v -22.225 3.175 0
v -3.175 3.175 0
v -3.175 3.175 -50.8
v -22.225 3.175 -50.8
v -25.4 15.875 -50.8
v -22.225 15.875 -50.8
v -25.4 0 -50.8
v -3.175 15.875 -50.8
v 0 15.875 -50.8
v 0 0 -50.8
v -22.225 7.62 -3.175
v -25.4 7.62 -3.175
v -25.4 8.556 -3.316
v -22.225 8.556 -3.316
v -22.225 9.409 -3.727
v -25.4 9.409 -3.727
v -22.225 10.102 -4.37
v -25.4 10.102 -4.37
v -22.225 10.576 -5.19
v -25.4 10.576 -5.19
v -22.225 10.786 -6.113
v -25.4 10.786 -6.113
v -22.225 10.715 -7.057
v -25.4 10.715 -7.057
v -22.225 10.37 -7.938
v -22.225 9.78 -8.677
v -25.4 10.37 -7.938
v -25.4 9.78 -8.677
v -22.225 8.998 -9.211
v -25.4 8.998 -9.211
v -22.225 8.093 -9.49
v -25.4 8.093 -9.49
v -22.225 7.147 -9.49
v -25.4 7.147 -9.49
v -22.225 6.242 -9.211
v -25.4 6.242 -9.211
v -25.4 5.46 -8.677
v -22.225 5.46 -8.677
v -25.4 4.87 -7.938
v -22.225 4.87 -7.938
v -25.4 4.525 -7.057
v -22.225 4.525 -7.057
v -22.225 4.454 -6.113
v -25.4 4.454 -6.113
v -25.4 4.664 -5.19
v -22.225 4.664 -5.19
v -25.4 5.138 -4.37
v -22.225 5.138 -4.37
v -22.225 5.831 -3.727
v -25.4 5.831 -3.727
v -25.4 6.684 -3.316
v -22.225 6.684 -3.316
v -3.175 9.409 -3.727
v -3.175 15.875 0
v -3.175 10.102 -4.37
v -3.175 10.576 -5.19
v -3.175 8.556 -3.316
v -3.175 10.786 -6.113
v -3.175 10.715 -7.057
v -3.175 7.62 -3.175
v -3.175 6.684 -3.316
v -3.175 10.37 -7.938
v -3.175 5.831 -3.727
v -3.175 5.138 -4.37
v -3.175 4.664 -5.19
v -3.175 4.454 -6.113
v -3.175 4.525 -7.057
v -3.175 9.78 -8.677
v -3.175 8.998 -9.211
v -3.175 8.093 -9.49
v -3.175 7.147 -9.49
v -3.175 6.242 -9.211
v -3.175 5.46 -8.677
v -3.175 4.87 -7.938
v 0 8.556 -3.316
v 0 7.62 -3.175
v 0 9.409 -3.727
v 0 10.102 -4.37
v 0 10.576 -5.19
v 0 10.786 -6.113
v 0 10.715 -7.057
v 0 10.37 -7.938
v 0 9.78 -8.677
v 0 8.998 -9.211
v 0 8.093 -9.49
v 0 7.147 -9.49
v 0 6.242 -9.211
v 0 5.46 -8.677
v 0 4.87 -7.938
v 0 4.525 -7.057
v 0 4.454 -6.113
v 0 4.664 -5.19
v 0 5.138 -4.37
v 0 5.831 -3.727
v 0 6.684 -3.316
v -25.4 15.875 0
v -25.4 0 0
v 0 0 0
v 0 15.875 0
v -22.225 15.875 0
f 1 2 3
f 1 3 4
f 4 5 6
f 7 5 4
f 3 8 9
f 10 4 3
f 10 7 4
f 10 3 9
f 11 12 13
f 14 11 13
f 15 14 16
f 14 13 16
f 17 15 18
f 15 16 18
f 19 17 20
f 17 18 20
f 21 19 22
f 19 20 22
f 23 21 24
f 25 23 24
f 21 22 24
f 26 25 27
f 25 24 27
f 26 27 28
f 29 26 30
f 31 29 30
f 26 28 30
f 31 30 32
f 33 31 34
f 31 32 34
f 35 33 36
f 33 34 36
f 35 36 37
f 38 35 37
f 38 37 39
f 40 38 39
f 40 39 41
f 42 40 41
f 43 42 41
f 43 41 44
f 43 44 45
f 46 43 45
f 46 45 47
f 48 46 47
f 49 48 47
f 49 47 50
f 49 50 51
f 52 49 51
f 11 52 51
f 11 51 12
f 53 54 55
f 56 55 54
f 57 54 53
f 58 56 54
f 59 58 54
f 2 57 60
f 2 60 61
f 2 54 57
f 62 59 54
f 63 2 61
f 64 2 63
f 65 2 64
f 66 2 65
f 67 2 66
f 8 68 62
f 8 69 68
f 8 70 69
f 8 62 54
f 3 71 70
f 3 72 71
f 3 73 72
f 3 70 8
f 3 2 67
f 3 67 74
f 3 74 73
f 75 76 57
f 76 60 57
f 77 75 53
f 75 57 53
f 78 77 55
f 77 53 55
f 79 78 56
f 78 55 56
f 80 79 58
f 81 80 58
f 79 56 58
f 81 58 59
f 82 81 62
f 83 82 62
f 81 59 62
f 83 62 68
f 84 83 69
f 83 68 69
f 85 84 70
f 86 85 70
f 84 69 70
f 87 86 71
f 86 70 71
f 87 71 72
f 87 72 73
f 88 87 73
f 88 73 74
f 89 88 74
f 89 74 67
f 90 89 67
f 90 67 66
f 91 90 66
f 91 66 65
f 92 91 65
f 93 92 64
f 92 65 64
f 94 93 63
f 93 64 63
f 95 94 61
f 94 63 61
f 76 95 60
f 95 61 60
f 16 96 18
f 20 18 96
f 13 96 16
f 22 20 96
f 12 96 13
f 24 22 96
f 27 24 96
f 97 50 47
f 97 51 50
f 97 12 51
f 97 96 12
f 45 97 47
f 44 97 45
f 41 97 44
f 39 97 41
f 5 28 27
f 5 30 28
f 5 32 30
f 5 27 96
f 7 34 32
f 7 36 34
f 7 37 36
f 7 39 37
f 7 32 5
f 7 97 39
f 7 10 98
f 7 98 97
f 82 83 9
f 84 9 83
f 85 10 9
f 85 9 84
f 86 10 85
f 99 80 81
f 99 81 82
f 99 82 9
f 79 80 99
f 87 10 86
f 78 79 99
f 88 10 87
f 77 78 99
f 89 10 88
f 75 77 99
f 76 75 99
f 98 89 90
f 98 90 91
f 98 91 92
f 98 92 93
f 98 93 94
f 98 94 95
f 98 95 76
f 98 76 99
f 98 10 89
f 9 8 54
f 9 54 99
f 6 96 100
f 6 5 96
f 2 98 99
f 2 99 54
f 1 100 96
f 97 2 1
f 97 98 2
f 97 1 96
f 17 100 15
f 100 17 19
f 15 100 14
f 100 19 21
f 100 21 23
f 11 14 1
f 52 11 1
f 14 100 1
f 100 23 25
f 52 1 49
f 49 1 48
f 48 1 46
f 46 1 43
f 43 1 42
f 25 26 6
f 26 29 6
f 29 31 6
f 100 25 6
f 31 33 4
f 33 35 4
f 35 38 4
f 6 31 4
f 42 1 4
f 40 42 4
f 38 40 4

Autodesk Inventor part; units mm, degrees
ref_plane "YZ Plane" through (0, 0, 0) normal (1, 0, 0) x (0, 1, 0)
ref_plane "XZ Plane" through (0, 0, 0) normal (0, 1, 0) x (-1, 0, 0)
ref_plane "XY Plane" through (0, 0, 0) normal (0, 0, 1) x (1, 0, 0)
sketch "Sketch1" plane through (0, 0, 0) normal (0, 1, 0) x (-1, 0, 0)
  line L0 (0, 0) -> (25.4, 0)
  line L1 (25.4, 0) -> (25.4, -50.8)
  line L2 (25.4, -50.8) -> (0, -50.8)
  line L3 (0, -50.8) -> (0, 0)
  dimension "d0" = 25.4
  dimension "d1" = 50.8
extrude "Extrusion1" add sketch "Sketch1" along normal blind 3.175
sketch "Sketch2" plane through (0, 3.175, 0) normal (0, 1, 0) x (1, 0, 0)
  line L0 (-25.4, 0) -> (0, 0) projected
  line L1 (0, 50.8) -> (-25.4, 50.8) projected
  line L2 (-25.4, 0) -> (-22.225, 0)
  line L3 (-22.225, 0) -> (-22.225, 50.8)
  line L4 (-22.225, 50.8) -> (-25.4, 50.8)
  line L5 (-25.4, 50.8) -> (-25.4, 0)
  line L6 (0, 0) -> (-3.175, 0)
  line L7 (-3.175, 0) -> (-3.175, 50.8)
  line L8 (-3.175, 50.8) -> (0, 50.8)
  line L9 (0, 50.8) -> (0, 0)
  dimension "d4" = 3.175
  dimension "d5" = 3.175
extrude "Extrusion2" add sketch "Sketch2" along normal blind 12.7 contours L5 L1 L3 L0 | L7 L1 L9 L0
sketch "Sketch3" plane through (-25.4, 0, -50.8) normal (-1, 0, 0) x (0, 0, 1)
  circle A0 centre (44.45, 7.62) radius 3.175
  line L0 (50.8, 0) -> (0, 0) projected
  line L1 (50.8, 0) -> (50.8, 15.875) projected
  dimension "d8" = 6.35
  dimension "d9" = 7.62
  dimension "d10" = 6.35
extrude "Extrusion3" cut sketch "Sketch3" against normal blind 25.4
properties part number "Manipulator2LeverAdapter"
